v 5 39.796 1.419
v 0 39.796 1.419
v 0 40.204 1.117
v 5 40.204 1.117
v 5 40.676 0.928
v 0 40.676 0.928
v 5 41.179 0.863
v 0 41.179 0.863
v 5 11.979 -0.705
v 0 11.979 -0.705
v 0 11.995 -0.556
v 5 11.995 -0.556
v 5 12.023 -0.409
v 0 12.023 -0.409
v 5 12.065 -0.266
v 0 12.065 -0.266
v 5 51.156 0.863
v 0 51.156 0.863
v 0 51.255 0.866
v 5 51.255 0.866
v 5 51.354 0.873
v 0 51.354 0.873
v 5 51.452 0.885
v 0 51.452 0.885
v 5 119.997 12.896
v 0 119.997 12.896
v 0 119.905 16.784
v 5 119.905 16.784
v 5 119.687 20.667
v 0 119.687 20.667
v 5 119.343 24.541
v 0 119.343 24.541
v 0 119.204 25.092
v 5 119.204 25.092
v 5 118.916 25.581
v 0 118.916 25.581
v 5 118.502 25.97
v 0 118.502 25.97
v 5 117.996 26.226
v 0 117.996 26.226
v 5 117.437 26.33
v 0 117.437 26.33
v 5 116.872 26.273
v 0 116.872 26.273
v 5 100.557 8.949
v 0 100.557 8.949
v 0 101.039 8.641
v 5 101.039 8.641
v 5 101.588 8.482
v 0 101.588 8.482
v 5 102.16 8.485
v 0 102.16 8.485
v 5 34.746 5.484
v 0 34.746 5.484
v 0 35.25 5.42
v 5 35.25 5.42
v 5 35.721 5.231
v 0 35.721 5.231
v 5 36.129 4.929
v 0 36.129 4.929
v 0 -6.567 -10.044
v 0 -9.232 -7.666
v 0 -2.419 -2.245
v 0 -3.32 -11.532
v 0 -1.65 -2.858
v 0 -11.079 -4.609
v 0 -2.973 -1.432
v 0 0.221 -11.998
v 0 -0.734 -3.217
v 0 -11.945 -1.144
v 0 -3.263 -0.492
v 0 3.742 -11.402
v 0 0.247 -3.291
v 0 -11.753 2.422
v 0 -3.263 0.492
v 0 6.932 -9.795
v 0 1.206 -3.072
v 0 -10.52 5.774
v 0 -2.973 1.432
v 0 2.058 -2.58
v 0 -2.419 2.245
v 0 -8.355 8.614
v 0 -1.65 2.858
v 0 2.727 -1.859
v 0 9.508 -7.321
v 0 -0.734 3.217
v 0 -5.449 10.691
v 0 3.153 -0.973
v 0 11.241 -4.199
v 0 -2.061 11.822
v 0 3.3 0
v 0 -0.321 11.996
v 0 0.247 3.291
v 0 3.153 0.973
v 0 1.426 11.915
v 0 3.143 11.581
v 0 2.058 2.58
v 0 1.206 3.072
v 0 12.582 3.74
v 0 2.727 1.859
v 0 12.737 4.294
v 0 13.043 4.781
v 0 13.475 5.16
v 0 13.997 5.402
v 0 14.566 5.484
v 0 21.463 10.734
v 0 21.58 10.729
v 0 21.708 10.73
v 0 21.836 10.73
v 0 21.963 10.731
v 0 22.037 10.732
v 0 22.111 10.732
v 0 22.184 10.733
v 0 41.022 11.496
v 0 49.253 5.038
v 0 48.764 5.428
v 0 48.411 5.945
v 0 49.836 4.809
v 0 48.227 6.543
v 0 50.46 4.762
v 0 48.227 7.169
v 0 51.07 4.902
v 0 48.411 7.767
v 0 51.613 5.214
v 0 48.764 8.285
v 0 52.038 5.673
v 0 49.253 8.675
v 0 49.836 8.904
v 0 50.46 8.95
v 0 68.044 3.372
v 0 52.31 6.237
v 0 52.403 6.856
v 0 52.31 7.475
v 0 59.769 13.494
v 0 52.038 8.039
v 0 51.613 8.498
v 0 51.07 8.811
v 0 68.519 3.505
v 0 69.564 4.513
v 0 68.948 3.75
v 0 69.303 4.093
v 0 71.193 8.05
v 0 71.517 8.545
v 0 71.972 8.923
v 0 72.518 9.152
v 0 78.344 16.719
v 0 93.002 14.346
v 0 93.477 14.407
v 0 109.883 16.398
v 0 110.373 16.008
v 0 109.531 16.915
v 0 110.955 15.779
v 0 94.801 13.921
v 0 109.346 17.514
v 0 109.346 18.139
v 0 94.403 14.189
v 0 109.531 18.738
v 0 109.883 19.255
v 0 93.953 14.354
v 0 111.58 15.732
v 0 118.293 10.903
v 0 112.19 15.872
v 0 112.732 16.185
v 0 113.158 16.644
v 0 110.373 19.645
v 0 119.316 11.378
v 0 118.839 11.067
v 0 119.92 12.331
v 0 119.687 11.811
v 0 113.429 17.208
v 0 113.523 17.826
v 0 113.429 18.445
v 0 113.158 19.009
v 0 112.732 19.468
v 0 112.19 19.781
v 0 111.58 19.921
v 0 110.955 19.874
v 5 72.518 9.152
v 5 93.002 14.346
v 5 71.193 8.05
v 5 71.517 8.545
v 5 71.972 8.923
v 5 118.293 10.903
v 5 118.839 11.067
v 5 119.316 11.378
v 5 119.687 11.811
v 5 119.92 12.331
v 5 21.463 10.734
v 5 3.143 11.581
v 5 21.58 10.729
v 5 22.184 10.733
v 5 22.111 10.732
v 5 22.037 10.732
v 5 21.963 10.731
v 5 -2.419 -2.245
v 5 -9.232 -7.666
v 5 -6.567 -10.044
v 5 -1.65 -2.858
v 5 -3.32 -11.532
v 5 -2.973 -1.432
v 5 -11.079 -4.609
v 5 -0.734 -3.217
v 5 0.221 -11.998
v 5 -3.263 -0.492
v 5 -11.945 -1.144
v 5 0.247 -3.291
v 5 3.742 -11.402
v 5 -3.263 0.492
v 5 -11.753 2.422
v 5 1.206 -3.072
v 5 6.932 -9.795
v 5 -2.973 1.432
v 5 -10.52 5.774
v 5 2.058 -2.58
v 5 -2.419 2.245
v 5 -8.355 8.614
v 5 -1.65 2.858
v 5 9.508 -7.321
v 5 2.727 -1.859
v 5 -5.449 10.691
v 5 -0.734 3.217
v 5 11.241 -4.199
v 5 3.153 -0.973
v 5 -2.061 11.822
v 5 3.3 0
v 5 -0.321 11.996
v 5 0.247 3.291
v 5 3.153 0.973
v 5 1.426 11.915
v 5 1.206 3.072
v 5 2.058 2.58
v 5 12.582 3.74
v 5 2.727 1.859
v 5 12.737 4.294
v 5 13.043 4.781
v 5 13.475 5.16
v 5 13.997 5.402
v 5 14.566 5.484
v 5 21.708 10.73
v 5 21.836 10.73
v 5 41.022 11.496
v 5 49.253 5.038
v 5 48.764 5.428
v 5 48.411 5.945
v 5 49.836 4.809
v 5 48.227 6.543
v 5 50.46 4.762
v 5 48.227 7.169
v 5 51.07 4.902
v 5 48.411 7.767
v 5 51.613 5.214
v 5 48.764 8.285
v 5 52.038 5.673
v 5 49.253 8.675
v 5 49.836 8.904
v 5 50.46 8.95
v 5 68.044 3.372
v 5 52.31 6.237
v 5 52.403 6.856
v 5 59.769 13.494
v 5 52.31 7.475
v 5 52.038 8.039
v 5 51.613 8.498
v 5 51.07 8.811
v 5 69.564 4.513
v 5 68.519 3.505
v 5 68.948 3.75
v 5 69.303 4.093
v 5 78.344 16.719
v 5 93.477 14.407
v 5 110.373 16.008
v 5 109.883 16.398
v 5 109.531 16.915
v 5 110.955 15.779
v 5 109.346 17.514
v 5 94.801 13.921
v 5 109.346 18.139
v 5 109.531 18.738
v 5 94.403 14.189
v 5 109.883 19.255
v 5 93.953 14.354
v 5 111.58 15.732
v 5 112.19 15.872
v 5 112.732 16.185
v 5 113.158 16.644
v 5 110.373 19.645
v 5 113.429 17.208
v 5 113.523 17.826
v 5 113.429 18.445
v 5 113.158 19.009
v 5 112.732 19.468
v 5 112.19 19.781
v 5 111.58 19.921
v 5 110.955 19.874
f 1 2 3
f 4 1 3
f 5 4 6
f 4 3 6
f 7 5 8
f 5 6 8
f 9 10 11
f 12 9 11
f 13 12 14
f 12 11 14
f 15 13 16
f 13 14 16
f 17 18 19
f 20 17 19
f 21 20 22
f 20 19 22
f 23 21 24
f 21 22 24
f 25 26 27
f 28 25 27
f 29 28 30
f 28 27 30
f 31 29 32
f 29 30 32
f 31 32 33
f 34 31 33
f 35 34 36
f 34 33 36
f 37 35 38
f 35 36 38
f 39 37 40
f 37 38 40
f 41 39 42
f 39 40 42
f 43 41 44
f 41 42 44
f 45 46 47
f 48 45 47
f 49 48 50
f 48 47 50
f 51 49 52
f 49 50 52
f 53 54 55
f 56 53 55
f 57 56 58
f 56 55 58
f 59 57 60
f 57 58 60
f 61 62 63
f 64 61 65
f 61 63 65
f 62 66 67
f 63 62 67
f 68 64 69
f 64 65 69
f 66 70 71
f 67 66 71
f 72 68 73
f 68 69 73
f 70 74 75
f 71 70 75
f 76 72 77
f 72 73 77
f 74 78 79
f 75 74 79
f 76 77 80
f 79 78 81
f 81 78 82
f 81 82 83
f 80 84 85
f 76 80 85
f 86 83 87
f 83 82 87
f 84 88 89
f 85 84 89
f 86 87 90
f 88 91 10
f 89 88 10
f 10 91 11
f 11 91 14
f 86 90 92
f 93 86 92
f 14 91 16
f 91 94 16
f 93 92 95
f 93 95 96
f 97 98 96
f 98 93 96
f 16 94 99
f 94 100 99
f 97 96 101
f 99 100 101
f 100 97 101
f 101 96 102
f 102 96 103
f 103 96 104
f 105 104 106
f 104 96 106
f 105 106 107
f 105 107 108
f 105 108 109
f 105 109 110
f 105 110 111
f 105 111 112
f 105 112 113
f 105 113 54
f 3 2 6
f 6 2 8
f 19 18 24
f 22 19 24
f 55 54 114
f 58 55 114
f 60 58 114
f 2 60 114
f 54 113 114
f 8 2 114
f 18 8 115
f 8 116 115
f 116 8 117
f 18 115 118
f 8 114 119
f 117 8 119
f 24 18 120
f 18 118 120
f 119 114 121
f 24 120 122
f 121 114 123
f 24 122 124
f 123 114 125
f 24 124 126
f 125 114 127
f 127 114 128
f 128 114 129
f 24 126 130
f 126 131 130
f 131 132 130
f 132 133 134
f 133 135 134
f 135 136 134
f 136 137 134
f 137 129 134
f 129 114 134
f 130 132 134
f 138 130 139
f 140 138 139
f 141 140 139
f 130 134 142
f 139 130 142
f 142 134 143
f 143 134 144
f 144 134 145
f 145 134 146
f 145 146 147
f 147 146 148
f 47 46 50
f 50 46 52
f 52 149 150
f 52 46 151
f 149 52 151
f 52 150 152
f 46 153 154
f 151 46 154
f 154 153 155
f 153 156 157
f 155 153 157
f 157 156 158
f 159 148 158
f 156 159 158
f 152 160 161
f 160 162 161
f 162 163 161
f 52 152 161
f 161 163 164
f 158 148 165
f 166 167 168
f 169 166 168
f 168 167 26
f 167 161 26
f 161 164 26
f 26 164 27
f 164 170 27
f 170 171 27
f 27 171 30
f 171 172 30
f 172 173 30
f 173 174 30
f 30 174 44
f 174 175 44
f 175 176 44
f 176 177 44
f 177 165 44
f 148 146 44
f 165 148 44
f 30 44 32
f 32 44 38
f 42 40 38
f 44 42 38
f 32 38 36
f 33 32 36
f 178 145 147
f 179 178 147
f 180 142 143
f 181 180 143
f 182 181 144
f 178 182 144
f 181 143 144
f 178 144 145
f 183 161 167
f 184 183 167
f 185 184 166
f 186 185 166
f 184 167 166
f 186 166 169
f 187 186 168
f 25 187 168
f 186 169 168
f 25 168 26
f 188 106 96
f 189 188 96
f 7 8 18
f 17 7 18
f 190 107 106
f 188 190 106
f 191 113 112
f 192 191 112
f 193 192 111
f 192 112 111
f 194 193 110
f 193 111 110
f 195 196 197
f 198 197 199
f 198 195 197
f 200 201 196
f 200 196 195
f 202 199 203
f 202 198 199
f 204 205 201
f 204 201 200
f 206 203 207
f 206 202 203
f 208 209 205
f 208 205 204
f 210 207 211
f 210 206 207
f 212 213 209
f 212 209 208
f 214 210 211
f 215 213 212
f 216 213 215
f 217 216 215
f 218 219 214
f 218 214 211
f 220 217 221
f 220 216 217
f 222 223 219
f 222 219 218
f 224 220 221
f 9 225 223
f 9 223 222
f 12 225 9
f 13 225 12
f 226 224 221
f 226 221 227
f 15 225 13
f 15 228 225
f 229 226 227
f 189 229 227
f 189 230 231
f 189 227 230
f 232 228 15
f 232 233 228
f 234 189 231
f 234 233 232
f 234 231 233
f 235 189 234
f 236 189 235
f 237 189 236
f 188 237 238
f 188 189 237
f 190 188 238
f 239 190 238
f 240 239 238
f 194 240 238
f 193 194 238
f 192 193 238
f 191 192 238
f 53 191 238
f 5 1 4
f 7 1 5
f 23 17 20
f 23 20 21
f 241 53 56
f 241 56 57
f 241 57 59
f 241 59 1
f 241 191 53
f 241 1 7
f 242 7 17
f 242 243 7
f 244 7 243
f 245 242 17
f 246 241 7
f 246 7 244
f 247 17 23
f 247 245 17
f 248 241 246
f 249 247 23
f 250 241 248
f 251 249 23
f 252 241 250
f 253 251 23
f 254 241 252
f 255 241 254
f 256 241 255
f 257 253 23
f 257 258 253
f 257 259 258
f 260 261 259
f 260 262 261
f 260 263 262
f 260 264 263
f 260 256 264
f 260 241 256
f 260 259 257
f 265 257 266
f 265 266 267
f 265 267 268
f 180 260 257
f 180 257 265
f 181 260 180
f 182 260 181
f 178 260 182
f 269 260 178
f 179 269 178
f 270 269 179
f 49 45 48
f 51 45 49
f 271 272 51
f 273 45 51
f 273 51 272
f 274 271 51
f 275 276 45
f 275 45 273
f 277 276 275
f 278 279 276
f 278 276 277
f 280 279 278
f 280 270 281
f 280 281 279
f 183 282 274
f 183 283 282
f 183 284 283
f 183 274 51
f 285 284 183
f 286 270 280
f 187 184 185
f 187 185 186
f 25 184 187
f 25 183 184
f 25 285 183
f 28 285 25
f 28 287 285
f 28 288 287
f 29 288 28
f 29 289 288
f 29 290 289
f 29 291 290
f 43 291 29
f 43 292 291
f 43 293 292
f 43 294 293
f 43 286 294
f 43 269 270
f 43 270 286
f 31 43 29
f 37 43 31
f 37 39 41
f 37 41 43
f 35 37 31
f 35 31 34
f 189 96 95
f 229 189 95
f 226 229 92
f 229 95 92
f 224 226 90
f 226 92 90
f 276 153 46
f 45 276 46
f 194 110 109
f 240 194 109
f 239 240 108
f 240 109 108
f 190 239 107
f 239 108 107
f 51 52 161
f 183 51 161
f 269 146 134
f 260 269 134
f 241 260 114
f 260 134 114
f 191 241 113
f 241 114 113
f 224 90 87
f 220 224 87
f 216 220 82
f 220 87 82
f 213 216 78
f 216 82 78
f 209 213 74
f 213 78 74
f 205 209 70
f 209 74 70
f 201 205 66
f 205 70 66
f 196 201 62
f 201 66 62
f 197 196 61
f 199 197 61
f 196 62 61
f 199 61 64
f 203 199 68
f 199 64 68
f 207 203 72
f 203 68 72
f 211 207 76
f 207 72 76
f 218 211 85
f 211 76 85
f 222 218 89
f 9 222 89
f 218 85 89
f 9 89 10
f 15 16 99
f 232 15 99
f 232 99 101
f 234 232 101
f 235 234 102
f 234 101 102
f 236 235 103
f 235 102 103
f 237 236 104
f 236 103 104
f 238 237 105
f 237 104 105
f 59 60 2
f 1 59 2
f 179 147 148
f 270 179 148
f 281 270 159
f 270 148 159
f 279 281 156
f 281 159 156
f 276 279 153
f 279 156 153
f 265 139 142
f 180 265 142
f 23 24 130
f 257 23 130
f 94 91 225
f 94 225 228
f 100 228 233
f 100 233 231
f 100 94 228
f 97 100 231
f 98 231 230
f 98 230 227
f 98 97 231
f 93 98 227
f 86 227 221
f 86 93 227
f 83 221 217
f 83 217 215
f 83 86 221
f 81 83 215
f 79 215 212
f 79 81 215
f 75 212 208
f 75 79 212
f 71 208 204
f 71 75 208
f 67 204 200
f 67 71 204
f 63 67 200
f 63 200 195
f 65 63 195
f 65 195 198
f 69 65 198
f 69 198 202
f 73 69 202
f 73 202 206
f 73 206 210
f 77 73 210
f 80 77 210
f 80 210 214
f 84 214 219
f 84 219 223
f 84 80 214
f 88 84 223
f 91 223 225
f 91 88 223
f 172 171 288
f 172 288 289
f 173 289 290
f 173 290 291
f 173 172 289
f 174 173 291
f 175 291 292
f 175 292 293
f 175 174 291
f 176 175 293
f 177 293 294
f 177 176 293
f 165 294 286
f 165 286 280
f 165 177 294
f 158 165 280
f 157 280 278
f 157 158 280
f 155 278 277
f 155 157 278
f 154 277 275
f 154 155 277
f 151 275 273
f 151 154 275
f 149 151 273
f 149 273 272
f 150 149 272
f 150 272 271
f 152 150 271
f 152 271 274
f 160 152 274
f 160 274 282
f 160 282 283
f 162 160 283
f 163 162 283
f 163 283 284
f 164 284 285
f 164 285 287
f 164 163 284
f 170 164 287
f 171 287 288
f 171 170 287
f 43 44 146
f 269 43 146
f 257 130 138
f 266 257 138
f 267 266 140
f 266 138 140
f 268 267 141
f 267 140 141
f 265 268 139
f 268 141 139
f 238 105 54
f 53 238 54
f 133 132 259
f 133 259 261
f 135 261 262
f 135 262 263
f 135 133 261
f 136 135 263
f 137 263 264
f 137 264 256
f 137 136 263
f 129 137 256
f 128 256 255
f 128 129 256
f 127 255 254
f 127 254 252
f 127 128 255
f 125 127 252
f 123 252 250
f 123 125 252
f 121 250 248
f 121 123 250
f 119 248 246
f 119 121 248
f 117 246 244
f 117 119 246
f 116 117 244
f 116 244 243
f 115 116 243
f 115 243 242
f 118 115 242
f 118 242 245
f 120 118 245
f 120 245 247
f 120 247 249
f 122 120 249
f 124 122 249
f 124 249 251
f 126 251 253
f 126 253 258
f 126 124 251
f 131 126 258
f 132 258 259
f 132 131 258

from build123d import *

# Parameters (mm, degrees)
F0_R     = 3.3
F0_R_2   = 2.1
F1_DEPTH = 5


# Not quite as in the source:
# - a feature names something its author has since deleted; it is built from what else it names


with BuildPart() as f1:
    # F0 (on Right) → F1 (new body)
    with BuildSketch(Plane.YZ):
        with BuildLine():
            ThreePointArc((21.8315579223, 10.717182122), (21.897134346, 10.7177196915), (21.9626931438, 10.7193322557))
            ThreePointArc((21.9626931438, 10.7193322557), (21.9630378123, 10.7252568669), (21.9633808826, 10.731181571))
            ThreePointArc((21.9633808826, 10.731181571), (21.7716697335, 10.7299327404), (21.5799577929, 10.728811993))
            Line((21.5799577929, 10.728811993), (21.8315579223, 10.717182122))
        make_face()
        with BuildLine():
            ThreePointArc((22.1844688263, 10.7327808001), (22.0736743793, 10.7245163933), (21.9626931438, 10.7193322557))
            ThreePointArc((21.9626931438, 10.7193322557), (21.897134346, 10.7177196915), (21.8315579223, 10.717182122))
            ThreePointArc((21.8315579223, 10.717182122), (21.6468606164, 10.7214485341), (21.4625573078, 10.7342386694))
            Line((21.4625573078, 10.7342386694), (3.1432257368, 11.581024651))
            Line((3.1432257368, 11.581024651), (-2.0614712889, 11.8216046341))
            ThreePointArc((-2.0614712889, 11.8216046341), (-7.9885695505, -8.9544824829), (11.9792964571, -0.7045966171))
            ThreePointArc((11.9792964571, -0.7045966171), (12.0074816864, -0.4822378377), (12.0652655082, -0.2656763826))
            Line((12.0652655082, -0.2656763826), (12.5823545671, 3.7402298466))
            ThreePointArc((12.5823545671, 3.7402298466), (13.2453067327, 4.9862024463), (14.565897859, 5.4841907695))
            Line((14.565897859, 5.4841907695), (34.746018001, 5.4841907695))
            ThreePointArc((34.746018001, 5.4841907695), (35.4911723527, 5.3401931919), (36.1290262829, 4.9289357615))
            Line((36.1290262829, 4.9289357615), (39.7961525429, 1.4185128035))
            ThreePointArc((39.7961525429, 1.4185128035), (40.4340064731, 1.0072553731), (41.1791608249, 0.8632577956))
            Line((41.1791608249, 0.8632577956), (51.1560065331, 0.8632577956))
            ThreePointArc((51.1560065331, 0.8632577956), (51.3046360431, 0.8687881245), (51.452443583, 0.8853485268))
            Line((51.452443583, 0.8853485268), (68.043755982, 3.3719538424))
            ThreePointArc((68.043755982, 3.3719538424), (68.9480745213, 3.750430082), (69.5639006382, 4.5131846154))
            Line((69.5639006382, 4.5131846154), (71.1927053136, 8.0496168184))
            ThreePointArc((71.1927053136, 8.0496168184), (71.7304115705, 8.7506241115), (72.5176709464, 9.151575379))
            Line((72.5176709464, 9.151575379), (93.0016589096, 14.3460792675))
            ThreePointArc((93.0016589096, 14.3460792675), (93.9531599103, 14.3538506609), (94.800564285, 13.9210454222))
            Line((94.800564285, 13.9210454222), (100.5567479715, 8.9494668086))
            ThreePointArc((100.5567479715, 8.9494668086), (101.3078443235, 8.5419637232), (102.1604743235, 8.4851607509))
            Line((102.1604743235, 8.4851607509), (118.2931486533, 10.9030281733))
            ThreePointArc((118.2931486533, 10.9030281733), (119.516973098, 11.5813971433), (119.9966558679, 12.8958685851))
            ThreePointArc((119.9966558679, 12.8958685851), (119.8113324935, 18.7264110882), (119.3428752162, 24.5410579746))
            ThreePointArc((119.3428752162, 24.5410579746), (118.5020303548, 25.9696085801), (116.872434029, 26.2732411356))
            Line((116.872434029, 26.2732411356), (78.344444671, 16.7187866332))
            ThreePointArc((78.344444671, 16.7187866332), (50.4120849121, 12.3407543123), (22.1844688263, 10.7327808001))
        make_face()
        Circle(F0_R, mode=Mode.SUBTRACT)
        with Locations((50.3031872213, 6.8563437089)):
            Circle(F0_R_2, mode=Mode.SUBTRACT)
        with Locations((111.4225909114, 17.8264938295)):
            Circle(F0_R_2, mode=Mode.SUBTRACT)
        with BuildLine():
            ThreePointArc((21.9633808826, 10.731181571), (21.9630378123, 10.7252568669), (21.9626931438, 10.7193322557))
            ThreePointArc((21.9626931438, 10.7193322557), (22.0736743793, 10.7245163933), (22.1844688263, 10.7327808001))
            ThreePointArc((22.1844688263, 10.7327808001), (22.0739250085, 10.7319598925), (21.9633808826, 10.731181571))
        make_face()
        with BuildLine():
            ThreePointArc((21.4625573078, 10.7342386694), (21.6468606164, 10.7214485341), (21.8315579223, 10.717182122))
            Line((21.8315579223, 10.717182122), (21.5799577929, 10.728811993))
            Line((21.5799577929, 10.728811993), (21.4625573078, 10.7342386694))
        make_face()
        with BuildLine():
            Line((-2.0614712889, 11.8216046341), (3.1432257368, 11.581024651))
            ThreePointArc((3.1432257368, 11.581024651), (0.5540919179, 11.9872007636), (-2.0614712889, 11.8216046341))
        make_face()
    extrude(amount=F1_DEPTH)


solid = f1.part
